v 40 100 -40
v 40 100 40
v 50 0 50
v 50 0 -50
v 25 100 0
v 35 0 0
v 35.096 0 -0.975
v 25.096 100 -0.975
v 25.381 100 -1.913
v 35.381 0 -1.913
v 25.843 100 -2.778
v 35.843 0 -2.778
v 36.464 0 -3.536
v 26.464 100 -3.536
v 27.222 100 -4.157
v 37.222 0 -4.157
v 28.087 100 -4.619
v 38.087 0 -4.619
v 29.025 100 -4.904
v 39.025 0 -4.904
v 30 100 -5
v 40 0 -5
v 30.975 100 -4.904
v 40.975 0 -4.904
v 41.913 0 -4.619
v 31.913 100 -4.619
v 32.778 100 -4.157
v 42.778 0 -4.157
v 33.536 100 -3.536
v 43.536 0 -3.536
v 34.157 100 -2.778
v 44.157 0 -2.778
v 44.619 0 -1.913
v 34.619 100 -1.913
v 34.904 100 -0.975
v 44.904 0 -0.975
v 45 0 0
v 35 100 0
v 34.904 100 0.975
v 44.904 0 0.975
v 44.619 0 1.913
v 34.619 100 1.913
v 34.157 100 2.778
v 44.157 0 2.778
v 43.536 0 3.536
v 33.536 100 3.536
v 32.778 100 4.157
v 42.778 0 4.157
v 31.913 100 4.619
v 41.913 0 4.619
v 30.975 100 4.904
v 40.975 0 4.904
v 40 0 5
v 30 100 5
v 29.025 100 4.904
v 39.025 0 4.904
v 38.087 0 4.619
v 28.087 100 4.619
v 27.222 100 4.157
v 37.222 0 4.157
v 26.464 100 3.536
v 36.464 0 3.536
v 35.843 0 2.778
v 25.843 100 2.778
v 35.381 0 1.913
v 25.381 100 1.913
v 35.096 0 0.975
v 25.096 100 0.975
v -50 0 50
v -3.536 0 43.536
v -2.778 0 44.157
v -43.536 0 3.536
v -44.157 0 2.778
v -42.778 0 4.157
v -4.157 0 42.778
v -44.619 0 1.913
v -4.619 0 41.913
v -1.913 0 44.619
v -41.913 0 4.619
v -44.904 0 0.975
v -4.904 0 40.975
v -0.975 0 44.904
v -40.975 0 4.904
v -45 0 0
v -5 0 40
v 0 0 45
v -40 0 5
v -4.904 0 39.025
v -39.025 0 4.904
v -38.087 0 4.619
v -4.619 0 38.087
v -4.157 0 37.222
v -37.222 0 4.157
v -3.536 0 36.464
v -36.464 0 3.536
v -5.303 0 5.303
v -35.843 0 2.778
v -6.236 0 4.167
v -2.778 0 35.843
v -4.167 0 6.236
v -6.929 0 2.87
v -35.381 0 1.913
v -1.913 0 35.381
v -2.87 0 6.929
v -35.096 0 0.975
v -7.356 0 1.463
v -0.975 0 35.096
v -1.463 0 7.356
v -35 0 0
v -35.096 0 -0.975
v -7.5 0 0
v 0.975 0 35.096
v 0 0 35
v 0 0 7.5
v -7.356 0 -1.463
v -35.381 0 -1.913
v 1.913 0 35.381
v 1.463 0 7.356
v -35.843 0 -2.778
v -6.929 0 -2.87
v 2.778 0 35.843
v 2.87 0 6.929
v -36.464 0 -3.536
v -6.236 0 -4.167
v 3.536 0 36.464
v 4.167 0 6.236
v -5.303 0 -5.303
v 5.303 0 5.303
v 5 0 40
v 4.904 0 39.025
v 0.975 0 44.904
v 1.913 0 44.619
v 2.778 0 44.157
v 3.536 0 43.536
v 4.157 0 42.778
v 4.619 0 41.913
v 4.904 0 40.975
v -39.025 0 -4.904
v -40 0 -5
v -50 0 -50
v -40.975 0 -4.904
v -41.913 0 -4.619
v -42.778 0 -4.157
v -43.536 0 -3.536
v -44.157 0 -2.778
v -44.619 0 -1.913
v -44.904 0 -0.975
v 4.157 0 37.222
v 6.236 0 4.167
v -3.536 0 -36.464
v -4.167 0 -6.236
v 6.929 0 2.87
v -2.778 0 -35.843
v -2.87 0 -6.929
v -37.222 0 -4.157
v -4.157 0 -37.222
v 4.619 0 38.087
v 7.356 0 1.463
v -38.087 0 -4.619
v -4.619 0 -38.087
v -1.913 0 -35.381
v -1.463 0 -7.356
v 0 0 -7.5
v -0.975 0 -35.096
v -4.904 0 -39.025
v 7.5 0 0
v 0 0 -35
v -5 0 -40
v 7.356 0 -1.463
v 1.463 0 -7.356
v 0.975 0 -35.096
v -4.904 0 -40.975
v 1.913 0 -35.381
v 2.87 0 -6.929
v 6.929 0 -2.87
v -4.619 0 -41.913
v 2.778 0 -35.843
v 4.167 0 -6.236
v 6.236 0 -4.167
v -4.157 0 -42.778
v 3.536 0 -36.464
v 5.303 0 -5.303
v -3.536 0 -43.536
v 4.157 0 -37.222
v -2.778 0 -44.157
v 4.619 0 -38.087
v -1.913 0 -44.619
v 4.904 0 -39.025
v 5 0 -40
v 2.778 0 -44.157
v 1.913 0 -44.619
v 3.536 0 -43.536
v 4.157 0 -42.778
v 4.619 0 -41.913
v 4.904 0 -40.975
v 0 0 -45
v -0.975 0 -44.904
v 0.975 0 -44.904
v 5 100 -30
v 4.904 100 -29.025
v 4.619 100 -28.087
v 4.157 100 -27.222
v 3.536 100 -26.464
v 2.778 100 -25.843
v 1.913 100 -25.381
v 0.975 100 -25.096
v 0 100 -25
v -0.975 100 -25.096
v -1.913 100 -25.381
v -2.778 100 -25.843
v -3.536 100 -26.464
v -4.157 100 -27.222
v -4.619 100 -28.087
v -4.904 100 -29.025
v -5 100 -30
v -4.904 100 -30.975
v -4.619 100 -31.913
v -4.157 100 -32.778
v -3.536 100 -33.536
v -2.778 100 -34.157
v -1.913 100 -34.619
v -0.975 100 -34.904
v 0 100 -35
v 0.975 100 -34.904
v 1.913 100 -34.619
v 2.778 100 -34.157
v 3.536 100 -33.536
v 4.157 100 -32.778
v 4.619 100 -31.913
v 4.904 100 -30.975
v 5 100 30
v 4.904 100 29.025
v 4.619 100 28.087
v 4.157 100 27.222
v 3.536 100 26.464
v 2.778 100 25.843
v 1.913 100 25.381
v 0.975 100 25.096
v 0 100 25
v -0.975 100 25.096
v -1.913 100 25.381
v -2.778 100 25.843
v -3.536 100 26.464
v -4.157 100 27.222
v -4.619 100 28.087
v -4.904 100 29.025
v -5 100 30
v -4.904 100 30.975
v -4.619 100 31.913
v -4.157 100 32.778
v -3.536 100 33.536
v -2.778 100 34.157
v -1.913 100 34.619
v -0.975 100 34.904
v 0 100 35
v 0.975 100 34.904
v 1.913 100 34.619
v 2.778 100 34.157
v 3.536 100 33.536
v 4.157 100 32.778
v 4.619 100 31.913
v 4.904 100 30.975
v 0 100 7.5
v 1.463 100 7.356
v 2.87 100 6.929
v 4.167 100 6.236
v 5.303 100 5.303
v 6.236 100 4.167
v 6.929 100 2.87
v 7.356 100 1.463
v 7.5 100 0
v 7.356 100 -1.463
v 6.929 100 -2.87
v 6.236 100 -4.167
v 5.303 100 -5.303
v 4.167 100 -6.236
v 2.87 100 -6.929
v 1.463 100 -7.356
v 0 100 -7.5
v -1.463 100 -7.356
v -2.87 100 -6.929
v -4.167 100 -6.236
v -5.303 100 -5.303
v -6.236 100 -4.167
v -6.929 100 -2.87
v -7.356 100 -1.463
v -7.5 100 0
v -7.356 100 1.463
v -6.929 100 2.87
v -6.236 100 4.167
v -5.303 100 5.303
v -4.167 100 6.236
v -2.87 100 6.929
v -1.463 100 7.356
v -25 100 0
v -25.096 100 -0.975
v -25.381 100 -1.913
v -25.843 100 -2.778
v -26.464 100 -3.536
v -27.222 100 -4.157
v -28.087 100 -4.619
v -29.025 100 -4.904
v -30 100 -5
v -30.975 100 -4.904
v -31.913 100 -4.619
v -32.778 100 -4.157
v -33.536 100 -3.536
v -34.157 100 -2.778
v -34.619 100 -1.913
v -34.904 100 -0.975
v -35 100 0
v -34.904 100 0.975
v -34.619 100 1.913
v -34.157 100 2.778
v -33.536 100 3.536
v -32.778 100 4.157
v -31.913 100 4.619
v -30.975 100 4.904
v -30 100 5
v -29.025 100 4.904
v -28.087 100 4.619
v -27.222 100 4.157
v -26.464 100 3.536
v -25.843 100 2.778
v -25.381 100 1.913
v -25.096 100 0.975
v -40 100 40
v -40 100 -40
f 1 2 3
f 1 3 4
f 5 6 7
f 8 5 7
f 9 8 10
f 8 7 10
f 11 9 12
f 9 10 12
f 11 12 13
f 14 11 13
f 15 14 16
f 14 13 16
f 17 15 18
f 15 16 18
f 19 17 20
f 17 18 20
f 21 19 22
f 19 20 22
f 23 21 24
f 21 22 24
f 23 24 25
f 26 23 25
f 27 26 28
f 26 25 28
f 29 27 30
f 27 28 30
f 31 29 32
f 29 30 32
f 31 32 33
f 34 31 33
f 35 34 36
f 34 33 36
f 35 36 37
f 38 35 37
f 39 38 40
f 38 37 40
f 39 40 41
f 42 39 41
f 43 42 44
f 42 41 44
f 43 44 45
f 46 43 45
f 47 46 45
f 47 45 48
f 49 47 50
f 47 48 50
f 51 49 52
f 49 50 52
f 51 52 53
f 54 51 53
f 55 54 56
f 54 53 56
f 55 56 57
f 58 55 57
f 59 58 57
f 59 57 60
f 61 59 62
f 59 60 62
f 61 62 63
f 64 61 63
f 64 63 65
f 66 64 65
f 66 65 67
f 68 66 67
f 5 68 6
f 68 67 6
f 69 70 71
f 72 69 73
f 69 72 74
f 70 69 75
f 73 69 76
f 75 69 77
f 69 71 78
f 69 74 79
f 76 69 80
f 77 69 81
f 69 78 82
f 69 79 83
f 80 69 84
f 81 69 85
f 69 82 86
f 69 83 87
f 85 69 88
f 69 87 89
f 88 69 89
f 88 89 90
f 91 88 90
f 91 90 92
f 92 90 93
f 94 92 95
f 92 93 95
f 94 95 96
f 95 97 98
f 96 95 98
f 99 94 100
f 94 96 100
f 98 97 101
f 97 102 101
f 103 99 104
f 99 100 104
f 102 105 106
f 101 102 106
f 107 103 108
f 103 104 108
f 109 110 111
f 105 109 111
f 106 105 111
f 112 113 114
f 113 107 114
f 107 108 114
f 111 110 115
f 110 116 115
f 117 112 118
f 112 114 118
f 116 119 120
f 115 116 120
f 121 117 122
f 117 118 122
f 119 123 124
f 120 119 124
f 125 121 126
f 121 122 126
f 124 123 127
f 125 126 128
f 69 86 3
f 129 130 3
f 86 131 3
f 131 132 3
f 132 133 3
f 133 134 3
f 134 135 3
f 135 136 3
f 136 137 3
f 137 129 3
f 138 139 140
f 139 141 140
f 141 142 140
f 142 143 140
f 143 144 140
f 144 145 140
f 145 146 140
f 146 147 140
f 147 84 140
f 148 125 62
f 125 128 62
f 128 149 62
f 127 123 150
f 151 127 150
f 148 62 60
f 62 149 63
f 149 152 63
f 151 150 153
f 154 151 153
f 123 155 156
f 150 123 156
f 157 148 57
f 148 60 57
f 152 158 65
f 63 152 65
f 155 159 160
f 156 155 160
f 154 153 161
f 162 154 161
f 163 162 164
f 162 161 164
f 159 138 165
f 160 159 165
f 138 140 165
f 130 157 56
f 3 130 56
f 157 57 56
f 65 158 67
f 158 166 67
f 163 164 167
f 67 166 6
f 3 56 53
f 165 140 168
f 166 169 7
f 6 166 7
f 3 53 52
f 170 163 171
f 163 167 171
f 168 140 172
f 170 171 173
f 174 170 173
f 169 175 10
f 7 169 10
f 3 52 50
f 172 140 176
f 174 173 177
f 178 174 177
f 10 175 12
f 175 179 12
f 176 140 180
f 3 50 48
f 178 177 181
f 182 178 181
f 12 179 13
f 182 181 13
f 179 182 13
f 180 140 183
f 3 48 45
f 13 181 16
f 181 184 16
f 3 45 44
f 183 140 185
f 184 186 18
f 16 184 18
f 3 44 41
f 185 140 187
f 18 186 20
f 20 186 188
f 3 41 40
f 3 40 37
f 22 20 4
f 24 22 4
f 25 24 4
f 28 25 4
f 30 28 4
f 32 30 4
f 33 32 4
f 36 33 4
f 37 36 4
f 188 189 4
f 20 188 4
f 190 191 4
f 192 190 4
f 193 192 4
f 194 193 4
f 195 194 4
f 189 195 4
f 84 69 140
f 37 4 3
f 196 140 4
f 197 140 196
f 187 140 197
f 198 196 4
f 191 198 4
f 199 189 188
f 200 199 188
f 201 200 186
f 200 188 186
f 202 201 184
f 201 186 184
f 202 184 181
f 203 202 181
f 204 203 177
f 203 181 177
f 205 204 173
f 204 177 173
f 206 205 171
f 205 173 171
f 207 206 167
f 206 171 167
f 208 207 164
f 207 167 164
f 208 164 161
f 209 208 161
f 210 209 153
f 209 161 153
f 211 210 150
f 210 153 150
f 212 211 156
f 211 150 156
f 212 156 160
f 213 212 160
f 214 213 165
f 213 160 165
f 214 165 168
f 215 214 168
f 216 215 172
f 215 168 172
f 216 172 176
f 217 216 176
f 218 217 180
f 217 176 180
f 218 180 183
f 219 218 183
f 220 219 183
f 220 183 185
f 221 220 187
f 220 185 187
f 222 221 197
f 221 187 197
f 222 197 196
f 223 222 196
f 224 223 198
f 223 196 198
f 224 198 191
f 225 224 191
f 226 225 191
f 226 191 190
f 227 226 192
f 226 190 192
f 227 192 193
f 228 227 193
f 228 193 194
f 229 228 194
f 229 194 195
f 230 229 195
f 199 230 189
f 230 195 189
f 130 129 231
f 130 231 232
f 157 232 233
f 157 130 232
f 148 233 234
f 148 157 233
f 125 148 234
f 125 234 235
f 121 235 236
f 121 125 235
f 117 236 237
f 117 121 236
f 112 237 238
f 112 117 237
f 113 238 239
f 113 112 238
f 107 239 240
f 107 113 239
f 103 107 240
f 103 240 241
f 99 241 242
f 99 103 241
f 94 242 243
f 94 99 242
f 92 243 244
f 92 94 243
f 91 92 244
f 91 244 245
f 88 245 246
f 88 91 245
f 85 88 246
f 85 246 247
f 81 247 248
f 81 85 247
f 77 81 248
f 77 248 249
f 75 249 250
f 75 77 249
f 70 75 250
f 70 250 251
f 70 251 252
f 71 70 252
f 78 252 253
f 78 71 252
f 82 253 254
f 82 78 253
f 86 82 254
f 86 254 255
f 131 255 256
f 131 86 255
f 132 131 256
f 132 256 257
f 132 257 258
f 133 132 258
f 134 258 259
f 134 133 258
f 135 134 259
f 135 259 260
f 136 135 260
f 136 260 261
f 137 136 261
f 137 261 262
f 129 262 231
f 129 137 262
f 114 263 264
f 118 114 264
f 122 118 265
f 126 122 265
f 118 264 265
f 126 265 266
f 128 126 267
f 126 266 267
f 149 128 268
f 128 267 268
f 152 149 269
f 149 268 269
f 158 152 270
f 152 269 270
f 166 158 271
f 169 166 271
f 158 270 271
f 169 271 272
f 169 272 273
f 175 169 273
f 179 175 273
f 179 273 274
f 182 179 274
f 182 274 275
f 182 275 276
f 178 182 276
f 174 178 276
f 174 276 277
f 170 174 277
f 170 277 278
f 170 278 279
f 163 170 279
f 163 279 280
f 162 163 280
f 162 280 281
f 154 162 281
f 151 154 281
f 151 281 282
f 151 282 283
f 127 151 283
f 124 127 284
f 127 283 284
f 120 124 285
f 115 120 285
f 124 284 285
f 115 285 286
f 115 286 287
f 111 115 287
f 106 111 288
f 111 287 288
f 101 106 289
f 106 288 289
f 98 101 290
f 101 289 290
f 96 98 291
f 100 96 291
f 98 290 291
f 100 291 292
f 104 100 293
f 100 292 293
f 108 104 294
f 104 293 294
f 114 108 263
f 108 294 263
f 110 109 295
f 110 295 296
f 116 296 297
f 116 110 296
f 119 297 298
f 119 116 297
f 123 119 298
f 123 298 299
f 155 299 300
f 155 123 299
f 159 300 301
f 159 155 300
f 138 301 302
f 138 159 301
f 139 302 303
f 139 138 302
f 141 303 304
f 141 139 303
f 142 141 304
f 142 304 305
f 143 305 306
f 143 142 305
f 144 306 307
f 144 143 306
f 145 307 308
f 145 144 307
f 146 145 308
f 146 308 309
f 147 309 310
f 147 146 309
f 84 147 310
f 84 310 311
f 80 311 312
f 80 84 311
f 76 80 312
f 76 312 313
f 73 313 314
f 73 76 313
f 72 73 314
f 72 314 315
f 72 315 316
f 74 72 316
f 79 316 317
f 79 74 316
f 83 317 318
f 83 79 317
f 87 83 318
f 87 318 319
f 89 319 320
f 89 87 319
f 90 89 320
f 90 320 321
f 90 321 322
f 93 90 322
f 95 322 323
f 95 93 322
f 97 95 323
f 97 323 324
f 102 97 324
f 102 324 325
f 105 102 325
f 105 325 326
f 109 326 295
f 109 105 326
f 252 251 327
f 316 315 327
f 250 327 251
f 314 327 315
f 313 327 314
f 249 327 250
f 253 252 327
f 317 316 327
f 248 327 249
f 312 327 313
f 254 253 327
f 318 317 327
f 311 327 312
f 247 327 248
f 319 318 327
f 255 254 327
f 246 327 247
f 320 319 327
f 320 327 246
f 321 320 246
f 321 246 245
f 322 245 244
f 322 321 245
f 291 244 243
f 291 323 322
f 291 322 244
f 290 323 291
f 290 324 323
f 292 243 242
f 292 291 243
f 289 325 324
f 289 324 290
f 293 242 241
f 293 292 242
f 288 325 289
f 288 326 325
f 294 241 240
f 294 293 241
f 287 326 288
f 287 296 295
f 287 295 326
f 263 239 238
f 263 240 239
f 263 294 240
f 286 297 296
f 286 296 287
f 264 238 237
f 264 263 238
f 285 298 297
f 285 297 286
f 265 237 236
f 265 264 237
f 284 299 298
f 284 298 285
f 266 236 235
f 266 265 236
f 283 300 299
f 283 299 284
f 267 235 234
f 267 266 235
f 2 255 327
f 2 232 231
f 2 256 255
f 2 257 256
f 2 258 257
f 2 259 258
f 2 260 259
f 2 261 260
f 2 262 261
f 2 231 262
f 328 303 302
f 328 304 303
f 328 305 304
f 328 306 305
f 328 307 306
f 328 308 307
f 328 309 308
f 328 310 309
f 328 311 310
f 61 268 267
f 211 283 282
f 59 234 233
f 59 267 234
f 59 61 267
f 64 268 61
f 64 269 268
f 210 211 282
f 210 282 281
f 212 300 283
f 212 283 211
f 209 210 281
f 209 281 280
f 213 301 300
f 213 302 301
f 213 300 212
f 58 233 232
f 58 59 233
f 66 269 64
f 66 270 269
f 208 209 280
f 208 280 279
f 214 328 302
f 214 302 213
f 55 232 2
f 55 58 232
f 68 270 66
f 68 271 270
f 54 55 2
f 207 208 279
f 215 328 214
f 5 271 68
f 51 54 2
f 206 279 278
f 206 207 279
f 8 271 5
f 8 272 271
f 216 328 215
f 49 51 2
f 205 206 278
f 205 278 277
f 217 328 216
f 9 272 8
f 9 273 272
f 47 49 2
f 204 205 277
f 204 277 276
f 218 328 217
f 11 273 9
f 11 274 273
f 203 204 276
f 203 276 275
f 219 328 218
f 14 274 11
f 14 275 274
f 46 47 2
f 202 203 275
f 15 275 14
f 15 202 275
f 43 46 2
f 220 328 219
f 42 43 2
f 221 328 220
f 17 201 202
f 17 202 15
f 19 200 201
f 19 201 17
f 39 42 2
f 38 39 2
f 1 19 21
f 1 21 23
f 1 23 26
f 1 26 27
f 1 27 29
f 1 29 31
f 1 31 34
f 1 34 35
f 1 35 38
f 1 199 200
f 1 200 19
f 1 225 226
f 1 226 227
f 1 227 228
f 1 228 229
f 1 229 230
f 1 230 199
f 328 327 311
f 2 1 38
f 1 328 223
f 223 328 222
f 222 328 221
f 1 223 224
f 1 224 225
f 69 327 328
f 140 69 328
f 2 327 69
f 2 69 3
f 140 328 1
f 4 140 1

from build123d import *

# Parameters (mm, degrees)
LOFT1_OUTLINE_W    = 80
LOFT1_OUTLINE_H    = 80
LOFT1_DEPTH        = 100
LOFT1_DRAFT        = 5.7105931
SKETCH4_R          = 7.5
CUT_EXTRUDE1_DEPTH = 123.474487085
SKETCH7_R          = 5
SKETCH9_R          = 5


# Read off the part's stored shape, not the designer's step: Loft1
with BuildPart() as part:
    # Loft1 outline → Loft1 (with draft: the straight prism first)
    with BuildSketch(Plane(origin=(0, 100, 0), x_dir=(1, 0, 0), z_dir=(0, 1, 0))):
        Rectangle(LOFT1_OUTLINE_W, LOFT1_OUTLINE_H)
    extrude(amount=-LOFT1_DEPTH)
    # Loft1: the draft: its side faces are tilted about the plane it starts from
    loft1_sides = [part.faces().sort_by_distance(p)[0] for p in [
        (40, 50, 0),
        (0, 50, -40),
        (-40, 50, 0),
        (0, 50, 40),
    ]]
    draft(loft1_sides, Plane(origin=(0, 100, 0), x_dir=(1, 0, 0), z_dir=(0, 1, 0)), LOFT1_DRAFT)

    # Sketch4 → Cut-Extrude1 (cut, through all)
    with BuildSketch(Plane(origin=(0, 100, 0), x_dir=(1, 0, 0), z_dir=(0, 1, 0))):
        with Locations(Location((0, 0, 0), (0, 0, 270))):
            Circle(SKETCH4_R)
    extrude(amount=-CUT_EXTRUDE1_DEPTH, mode=Mode.SUBTRACT)

    # Cut-Sweep1: sweep along a path in Sketch8
    with BuildLine(Plane.XY) as cut_sweep1_path:
        Line((-30, 100), (-40, 0))
    # Sketch7 → Cut-Sweep1 (sweep, cut)
    with BuildSketch(Plane(origin=(0, 100, 0), x_dir=(1, 0, 0), z_dir=(0, 1, 0))):
        with Locations((-30, 0)):
            Circle(SKETCH7_R)
    cut_sweep1 = sweep(path=cut_sweep1_path.line, mode=Mode.SUBTRACT)

    # Mirror1: Cut-Sweep1 across plane
    add(cut_sweep1.mirror(Plane(origin=(0, 0, 0), x_dir=(0, 0, 1), z_dir=(1, 0, 0))), mode=Mode.SUBTRACT)

    # Cut-Sweep2: sweep along a path in Sketch10
    with BuildLine(Plane(origin=(0, 0, 0), x_dir=(0, 0, -1), z_dir=(1, 0, 0))) as cut_sweep2_path:
        Line((-30, 100), (-40, 0))
    # Sketch9 → Cut-Sweep2 (sweep, cut)
    with BuildSketch(Plane(origin=(0, 100, 0), x_dir=(1, 0, 0), z_dir=(0, 1, 0))):
        with Locations((0, -30)):
            Circle(SKETCH9_R)
    cut_sweep2 = sweep(path=cut_sweep2_path.line, mode=Mode.SUBTRACT)

    # Mirror2: Cut-Sweep2 across plane
    add(cut_sweep2.mirror(Plane.XY), mode=Mode.SUBTRACT)


solid = part.part
